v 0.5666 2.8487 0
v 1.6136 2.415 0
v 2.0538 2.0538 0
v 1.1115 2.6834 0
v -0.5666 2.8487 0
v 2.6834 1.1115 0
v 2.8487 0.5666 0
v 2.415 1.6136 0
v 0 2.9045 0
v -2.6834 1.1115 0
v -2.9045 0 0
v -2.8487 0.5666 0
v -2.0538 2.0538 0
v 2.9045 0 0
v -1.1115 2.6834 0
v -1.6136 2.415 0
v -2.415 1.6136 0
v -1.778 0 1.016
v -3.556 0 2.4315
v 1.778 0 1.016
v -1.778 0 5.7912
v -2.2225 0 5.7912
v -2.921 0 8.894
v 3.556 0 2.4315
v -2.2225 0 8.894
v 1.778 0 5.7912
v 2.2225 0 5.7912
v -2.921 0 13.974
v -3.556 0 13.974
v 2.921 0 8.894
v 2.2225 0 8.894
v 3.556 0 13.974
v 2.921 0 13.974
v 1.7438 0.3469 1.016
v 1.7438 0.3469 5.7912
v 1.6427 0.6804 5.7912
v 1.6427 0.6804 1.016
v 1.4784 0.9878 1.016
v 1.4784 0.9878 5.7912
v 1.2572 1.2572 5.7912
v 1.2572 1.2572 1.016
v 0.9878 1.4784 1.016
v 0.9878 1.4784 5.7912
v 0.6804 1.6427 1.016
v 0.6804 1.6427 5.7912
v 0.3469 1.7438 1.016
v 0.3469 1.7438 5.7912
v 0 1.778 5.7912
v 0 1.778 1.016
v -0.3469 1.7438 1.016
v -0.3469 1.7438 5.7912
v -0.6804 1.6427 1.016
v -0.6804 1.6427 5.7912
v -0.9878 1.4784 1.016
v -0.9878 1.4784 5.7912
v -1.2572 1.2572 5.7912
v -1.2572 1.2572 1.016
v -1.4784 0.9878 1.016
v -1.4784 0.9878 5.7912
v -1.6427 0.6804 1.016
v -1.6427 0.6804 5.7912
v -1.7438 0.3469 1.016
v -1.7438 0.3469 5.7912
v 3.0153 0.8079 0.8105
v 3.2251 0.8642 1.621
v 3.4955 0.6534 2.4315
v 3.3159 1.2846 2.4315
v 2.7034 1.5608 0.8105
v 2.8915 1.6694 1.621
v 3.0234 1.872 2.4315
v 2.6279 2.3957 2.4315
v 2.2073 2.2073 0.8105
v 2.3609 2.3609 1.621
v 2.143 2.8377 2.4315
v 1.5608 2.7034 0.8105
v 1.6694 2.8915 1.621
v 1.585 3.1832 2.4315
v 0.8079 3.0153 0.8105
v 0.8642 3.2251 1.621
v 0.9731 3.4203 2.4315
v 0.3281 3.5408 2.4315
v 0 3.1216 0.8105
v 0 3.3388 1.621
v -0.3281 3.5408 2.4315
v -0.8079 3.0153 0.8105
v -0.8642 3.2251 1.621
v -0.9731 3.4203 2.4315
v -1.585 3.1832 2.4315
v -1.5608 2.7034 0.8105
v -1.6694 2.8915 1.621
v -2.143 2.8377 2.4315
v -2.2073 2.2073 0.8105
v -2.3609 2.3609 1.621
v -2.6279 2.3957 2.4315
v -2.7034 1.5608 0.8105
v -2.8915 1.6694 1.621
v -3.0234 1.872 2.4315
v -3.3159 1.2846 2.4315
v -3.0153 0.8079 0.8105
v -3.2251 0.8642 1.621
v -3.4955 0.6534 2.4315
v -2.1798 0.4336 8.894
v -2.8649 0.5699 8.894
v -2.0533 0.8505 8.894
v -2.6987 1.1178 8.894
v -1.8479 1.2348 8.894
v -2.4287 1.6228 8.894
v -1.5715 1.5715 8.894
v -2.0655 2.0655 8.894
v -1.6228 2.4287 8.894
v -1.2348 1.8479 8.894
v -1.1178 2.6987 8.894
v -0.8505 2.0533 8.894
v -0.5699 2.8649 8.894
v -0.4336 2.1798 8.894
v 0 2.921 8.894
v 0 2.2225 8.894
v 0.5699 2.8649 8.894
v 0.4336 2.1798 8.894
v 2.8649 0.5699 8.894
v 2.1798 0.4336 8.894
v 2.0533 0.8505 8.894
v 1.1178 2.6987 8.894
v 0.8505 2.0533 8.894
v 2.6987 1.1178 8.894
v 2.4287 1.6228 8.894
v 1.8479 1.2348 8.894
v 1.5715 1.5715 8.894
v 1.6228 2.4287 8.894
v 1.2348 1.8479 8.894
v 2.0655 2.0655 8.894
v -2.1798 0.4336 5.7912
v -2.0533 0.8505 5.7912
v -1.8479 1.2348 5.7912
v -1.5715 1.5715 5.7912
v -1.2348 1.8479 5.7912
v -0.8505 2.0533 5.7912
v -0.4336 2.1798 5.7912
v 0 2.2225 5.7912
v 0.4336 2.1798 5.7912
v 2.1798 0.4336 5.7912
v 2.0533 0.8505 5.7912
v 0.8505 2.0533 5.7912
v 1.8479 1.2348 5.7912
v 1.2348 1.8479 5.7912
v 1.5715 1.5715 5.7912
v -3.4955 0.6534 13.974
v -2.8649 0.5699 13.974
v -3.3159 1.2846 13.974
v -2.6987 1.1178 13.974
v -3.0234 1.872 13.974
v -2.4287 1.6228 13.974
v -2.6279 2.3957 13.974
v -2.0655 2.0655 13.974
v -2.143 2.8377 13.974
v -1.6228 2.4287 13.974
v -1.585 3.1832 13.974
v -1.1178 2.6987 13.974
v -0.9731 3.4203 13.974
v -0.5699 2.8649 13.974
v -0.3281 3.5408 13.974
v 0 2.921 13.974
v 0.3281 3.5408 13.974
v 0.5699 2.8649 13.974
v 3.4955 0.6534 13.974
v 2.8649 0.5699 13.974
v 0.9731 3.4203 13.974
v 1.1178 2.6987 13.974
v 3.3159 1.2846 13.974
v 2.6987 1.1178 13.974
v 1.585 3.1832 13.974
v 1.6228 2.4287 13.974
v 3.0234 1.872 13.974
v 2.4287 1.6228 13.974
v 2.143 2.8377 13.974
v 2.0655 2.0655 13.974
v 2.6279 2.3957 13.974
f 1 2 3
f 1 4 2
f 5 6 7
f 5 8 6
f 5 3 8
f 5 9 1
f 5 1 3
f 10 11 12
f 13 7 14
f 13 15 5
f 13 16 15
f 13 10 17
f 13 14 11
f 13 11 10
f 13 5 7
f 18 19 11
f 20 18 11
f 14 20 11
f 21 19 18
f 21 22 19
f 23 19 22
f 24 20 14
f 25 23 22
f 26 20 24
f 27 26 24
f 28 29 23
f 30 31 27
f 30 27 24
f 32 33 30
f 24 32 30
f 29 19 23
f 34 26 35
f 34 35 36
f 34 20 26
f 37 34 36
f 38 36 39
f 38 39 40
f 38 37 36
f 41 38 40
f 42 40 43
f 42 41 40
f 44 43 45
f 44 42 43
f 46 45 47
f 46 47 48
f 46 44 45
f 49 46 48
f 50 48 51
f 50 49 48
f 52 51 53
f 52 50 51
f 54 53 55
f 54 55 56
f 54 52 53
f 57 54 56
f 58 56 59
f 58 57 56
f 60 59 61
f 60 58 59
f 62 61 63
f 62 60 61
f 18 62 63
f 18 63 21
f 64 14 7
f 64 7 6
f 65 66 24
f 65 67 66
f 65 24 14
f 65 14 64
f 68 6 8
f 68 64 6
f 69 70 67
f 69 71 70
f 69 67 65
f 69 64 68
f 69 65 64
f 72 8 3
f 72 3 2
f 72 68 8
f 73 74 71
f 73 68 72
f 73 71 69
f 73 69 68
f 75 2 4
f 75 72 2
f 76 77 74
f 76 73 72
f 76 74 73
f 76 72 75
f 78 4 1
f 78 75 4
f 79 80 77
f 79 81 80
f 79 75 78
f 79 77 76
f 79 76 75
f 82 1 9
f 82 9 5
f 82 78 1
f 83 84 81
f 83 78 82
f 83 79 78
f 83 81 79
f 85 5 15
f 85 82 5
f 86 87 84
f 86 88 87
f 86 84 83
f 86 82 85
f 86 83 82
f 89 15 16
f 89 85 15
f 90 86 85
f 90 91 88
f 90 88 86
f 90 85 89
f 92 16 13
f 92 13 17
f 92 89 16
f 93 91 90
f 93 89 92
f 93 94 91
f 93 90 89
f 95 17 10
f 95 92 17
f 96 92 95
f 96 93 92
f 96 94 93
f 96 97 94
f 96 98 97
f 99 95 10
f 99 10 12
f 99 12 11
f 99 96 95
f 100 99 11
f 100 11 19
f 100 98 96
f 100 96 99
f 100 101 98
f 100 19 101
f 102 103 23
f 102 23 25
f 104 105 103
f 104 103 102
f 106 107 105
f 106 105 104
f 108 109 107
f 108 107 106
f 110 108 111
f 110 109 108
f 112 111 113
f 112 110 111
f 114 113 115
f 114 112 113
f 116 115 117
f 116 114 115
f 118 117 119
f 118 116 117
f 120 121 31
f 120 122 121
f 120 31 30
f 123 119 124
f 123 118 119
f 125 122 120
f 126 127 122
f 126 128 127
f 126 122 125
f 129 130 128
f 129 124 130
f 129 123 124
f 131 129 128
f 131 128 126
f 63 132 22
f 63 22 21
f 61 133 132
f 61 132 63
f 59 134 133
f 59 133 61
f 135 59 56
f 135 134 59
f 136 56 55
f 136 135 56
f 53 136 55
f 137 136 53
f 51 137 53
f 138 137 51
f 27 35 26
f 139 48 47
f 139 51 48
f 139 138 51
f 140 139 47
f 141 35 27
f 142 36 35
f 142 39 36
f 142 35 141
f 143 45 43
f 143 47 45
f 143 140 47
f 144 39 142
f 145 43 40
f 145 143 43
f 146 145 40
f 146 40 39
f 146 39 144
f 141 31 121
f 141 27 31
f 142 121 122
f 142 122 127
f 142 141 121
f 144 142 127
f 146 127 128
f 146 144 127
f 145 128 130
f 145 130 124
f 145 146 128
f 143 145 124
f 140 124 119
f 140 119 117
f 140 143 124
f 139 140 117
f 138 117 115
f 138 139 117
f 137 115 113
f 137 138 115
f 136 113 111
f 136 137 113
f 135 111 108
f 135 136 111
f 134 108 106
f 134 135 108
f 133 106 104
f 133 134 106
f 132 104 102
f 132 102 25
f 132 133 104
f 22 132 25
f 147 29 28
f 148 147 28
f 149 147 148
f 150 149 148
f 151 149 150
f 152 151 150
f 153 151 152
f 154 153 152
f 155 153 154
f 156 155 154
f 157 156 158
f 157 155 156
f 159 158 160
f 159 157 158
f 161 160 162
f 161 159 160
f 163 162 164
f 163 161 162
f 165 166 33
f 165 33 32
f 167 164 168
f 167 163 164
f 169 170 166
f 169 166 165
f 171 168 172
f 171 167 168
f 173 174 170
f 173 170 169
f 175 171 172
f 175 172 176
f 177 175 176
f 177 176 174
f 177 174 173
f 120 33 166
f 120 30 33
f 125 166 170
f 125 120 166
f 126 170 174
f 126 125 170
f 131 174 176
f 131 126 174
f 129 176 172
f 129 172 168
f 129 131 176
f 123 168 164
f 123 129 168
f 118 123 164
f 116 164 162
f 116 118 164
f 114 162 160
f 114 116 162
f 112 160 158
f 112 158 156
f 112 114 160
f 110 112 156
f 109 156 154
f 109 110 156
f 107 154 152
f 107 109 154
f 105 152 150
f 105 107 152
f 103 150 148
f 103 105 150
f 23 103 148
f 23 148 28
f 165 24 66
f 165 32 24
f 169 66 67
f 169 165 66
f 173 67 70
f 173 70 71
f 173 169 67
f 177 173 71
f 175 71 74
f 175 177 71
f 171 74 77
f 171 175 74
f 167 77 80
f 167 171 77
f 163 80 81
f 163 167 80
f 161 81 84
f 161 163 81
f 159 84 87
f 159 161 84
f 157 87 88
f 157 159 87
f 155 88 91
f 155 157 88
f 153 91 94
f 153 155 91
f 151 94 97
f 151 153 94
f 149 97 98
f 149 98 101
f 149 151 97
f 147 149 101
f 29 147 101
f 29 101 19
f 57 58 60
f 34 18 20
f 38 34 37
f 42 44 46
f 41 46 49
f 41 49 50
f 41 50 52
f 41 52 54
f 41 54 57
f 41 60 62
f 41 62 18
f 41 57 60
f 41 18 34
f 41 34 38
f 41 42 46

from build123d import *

# Parameters (mm, degrees)
F1_ANGLE = 180


with BuildPart() as f1:
    # F0 (on Front) → F1 (revolve)
    with BuildSketch(Plane.XZ):
        Polygon((2.904469, 0), (3.556, 2.431545), (3.556, 13.974021), (2.921, 13.974021), (2.921, 8.894021), (2.2225, 8.894021), (2.2225, 5.7912), (1.778, 5.7912), (1.778, 1.016), (0, 1.016), (0, 0), align=None)
    revolve(axis=Axis((0, 0, 0.508), (0, 0, 1)), revolution_arc=F1_ANGLE)


solid = f1.part
